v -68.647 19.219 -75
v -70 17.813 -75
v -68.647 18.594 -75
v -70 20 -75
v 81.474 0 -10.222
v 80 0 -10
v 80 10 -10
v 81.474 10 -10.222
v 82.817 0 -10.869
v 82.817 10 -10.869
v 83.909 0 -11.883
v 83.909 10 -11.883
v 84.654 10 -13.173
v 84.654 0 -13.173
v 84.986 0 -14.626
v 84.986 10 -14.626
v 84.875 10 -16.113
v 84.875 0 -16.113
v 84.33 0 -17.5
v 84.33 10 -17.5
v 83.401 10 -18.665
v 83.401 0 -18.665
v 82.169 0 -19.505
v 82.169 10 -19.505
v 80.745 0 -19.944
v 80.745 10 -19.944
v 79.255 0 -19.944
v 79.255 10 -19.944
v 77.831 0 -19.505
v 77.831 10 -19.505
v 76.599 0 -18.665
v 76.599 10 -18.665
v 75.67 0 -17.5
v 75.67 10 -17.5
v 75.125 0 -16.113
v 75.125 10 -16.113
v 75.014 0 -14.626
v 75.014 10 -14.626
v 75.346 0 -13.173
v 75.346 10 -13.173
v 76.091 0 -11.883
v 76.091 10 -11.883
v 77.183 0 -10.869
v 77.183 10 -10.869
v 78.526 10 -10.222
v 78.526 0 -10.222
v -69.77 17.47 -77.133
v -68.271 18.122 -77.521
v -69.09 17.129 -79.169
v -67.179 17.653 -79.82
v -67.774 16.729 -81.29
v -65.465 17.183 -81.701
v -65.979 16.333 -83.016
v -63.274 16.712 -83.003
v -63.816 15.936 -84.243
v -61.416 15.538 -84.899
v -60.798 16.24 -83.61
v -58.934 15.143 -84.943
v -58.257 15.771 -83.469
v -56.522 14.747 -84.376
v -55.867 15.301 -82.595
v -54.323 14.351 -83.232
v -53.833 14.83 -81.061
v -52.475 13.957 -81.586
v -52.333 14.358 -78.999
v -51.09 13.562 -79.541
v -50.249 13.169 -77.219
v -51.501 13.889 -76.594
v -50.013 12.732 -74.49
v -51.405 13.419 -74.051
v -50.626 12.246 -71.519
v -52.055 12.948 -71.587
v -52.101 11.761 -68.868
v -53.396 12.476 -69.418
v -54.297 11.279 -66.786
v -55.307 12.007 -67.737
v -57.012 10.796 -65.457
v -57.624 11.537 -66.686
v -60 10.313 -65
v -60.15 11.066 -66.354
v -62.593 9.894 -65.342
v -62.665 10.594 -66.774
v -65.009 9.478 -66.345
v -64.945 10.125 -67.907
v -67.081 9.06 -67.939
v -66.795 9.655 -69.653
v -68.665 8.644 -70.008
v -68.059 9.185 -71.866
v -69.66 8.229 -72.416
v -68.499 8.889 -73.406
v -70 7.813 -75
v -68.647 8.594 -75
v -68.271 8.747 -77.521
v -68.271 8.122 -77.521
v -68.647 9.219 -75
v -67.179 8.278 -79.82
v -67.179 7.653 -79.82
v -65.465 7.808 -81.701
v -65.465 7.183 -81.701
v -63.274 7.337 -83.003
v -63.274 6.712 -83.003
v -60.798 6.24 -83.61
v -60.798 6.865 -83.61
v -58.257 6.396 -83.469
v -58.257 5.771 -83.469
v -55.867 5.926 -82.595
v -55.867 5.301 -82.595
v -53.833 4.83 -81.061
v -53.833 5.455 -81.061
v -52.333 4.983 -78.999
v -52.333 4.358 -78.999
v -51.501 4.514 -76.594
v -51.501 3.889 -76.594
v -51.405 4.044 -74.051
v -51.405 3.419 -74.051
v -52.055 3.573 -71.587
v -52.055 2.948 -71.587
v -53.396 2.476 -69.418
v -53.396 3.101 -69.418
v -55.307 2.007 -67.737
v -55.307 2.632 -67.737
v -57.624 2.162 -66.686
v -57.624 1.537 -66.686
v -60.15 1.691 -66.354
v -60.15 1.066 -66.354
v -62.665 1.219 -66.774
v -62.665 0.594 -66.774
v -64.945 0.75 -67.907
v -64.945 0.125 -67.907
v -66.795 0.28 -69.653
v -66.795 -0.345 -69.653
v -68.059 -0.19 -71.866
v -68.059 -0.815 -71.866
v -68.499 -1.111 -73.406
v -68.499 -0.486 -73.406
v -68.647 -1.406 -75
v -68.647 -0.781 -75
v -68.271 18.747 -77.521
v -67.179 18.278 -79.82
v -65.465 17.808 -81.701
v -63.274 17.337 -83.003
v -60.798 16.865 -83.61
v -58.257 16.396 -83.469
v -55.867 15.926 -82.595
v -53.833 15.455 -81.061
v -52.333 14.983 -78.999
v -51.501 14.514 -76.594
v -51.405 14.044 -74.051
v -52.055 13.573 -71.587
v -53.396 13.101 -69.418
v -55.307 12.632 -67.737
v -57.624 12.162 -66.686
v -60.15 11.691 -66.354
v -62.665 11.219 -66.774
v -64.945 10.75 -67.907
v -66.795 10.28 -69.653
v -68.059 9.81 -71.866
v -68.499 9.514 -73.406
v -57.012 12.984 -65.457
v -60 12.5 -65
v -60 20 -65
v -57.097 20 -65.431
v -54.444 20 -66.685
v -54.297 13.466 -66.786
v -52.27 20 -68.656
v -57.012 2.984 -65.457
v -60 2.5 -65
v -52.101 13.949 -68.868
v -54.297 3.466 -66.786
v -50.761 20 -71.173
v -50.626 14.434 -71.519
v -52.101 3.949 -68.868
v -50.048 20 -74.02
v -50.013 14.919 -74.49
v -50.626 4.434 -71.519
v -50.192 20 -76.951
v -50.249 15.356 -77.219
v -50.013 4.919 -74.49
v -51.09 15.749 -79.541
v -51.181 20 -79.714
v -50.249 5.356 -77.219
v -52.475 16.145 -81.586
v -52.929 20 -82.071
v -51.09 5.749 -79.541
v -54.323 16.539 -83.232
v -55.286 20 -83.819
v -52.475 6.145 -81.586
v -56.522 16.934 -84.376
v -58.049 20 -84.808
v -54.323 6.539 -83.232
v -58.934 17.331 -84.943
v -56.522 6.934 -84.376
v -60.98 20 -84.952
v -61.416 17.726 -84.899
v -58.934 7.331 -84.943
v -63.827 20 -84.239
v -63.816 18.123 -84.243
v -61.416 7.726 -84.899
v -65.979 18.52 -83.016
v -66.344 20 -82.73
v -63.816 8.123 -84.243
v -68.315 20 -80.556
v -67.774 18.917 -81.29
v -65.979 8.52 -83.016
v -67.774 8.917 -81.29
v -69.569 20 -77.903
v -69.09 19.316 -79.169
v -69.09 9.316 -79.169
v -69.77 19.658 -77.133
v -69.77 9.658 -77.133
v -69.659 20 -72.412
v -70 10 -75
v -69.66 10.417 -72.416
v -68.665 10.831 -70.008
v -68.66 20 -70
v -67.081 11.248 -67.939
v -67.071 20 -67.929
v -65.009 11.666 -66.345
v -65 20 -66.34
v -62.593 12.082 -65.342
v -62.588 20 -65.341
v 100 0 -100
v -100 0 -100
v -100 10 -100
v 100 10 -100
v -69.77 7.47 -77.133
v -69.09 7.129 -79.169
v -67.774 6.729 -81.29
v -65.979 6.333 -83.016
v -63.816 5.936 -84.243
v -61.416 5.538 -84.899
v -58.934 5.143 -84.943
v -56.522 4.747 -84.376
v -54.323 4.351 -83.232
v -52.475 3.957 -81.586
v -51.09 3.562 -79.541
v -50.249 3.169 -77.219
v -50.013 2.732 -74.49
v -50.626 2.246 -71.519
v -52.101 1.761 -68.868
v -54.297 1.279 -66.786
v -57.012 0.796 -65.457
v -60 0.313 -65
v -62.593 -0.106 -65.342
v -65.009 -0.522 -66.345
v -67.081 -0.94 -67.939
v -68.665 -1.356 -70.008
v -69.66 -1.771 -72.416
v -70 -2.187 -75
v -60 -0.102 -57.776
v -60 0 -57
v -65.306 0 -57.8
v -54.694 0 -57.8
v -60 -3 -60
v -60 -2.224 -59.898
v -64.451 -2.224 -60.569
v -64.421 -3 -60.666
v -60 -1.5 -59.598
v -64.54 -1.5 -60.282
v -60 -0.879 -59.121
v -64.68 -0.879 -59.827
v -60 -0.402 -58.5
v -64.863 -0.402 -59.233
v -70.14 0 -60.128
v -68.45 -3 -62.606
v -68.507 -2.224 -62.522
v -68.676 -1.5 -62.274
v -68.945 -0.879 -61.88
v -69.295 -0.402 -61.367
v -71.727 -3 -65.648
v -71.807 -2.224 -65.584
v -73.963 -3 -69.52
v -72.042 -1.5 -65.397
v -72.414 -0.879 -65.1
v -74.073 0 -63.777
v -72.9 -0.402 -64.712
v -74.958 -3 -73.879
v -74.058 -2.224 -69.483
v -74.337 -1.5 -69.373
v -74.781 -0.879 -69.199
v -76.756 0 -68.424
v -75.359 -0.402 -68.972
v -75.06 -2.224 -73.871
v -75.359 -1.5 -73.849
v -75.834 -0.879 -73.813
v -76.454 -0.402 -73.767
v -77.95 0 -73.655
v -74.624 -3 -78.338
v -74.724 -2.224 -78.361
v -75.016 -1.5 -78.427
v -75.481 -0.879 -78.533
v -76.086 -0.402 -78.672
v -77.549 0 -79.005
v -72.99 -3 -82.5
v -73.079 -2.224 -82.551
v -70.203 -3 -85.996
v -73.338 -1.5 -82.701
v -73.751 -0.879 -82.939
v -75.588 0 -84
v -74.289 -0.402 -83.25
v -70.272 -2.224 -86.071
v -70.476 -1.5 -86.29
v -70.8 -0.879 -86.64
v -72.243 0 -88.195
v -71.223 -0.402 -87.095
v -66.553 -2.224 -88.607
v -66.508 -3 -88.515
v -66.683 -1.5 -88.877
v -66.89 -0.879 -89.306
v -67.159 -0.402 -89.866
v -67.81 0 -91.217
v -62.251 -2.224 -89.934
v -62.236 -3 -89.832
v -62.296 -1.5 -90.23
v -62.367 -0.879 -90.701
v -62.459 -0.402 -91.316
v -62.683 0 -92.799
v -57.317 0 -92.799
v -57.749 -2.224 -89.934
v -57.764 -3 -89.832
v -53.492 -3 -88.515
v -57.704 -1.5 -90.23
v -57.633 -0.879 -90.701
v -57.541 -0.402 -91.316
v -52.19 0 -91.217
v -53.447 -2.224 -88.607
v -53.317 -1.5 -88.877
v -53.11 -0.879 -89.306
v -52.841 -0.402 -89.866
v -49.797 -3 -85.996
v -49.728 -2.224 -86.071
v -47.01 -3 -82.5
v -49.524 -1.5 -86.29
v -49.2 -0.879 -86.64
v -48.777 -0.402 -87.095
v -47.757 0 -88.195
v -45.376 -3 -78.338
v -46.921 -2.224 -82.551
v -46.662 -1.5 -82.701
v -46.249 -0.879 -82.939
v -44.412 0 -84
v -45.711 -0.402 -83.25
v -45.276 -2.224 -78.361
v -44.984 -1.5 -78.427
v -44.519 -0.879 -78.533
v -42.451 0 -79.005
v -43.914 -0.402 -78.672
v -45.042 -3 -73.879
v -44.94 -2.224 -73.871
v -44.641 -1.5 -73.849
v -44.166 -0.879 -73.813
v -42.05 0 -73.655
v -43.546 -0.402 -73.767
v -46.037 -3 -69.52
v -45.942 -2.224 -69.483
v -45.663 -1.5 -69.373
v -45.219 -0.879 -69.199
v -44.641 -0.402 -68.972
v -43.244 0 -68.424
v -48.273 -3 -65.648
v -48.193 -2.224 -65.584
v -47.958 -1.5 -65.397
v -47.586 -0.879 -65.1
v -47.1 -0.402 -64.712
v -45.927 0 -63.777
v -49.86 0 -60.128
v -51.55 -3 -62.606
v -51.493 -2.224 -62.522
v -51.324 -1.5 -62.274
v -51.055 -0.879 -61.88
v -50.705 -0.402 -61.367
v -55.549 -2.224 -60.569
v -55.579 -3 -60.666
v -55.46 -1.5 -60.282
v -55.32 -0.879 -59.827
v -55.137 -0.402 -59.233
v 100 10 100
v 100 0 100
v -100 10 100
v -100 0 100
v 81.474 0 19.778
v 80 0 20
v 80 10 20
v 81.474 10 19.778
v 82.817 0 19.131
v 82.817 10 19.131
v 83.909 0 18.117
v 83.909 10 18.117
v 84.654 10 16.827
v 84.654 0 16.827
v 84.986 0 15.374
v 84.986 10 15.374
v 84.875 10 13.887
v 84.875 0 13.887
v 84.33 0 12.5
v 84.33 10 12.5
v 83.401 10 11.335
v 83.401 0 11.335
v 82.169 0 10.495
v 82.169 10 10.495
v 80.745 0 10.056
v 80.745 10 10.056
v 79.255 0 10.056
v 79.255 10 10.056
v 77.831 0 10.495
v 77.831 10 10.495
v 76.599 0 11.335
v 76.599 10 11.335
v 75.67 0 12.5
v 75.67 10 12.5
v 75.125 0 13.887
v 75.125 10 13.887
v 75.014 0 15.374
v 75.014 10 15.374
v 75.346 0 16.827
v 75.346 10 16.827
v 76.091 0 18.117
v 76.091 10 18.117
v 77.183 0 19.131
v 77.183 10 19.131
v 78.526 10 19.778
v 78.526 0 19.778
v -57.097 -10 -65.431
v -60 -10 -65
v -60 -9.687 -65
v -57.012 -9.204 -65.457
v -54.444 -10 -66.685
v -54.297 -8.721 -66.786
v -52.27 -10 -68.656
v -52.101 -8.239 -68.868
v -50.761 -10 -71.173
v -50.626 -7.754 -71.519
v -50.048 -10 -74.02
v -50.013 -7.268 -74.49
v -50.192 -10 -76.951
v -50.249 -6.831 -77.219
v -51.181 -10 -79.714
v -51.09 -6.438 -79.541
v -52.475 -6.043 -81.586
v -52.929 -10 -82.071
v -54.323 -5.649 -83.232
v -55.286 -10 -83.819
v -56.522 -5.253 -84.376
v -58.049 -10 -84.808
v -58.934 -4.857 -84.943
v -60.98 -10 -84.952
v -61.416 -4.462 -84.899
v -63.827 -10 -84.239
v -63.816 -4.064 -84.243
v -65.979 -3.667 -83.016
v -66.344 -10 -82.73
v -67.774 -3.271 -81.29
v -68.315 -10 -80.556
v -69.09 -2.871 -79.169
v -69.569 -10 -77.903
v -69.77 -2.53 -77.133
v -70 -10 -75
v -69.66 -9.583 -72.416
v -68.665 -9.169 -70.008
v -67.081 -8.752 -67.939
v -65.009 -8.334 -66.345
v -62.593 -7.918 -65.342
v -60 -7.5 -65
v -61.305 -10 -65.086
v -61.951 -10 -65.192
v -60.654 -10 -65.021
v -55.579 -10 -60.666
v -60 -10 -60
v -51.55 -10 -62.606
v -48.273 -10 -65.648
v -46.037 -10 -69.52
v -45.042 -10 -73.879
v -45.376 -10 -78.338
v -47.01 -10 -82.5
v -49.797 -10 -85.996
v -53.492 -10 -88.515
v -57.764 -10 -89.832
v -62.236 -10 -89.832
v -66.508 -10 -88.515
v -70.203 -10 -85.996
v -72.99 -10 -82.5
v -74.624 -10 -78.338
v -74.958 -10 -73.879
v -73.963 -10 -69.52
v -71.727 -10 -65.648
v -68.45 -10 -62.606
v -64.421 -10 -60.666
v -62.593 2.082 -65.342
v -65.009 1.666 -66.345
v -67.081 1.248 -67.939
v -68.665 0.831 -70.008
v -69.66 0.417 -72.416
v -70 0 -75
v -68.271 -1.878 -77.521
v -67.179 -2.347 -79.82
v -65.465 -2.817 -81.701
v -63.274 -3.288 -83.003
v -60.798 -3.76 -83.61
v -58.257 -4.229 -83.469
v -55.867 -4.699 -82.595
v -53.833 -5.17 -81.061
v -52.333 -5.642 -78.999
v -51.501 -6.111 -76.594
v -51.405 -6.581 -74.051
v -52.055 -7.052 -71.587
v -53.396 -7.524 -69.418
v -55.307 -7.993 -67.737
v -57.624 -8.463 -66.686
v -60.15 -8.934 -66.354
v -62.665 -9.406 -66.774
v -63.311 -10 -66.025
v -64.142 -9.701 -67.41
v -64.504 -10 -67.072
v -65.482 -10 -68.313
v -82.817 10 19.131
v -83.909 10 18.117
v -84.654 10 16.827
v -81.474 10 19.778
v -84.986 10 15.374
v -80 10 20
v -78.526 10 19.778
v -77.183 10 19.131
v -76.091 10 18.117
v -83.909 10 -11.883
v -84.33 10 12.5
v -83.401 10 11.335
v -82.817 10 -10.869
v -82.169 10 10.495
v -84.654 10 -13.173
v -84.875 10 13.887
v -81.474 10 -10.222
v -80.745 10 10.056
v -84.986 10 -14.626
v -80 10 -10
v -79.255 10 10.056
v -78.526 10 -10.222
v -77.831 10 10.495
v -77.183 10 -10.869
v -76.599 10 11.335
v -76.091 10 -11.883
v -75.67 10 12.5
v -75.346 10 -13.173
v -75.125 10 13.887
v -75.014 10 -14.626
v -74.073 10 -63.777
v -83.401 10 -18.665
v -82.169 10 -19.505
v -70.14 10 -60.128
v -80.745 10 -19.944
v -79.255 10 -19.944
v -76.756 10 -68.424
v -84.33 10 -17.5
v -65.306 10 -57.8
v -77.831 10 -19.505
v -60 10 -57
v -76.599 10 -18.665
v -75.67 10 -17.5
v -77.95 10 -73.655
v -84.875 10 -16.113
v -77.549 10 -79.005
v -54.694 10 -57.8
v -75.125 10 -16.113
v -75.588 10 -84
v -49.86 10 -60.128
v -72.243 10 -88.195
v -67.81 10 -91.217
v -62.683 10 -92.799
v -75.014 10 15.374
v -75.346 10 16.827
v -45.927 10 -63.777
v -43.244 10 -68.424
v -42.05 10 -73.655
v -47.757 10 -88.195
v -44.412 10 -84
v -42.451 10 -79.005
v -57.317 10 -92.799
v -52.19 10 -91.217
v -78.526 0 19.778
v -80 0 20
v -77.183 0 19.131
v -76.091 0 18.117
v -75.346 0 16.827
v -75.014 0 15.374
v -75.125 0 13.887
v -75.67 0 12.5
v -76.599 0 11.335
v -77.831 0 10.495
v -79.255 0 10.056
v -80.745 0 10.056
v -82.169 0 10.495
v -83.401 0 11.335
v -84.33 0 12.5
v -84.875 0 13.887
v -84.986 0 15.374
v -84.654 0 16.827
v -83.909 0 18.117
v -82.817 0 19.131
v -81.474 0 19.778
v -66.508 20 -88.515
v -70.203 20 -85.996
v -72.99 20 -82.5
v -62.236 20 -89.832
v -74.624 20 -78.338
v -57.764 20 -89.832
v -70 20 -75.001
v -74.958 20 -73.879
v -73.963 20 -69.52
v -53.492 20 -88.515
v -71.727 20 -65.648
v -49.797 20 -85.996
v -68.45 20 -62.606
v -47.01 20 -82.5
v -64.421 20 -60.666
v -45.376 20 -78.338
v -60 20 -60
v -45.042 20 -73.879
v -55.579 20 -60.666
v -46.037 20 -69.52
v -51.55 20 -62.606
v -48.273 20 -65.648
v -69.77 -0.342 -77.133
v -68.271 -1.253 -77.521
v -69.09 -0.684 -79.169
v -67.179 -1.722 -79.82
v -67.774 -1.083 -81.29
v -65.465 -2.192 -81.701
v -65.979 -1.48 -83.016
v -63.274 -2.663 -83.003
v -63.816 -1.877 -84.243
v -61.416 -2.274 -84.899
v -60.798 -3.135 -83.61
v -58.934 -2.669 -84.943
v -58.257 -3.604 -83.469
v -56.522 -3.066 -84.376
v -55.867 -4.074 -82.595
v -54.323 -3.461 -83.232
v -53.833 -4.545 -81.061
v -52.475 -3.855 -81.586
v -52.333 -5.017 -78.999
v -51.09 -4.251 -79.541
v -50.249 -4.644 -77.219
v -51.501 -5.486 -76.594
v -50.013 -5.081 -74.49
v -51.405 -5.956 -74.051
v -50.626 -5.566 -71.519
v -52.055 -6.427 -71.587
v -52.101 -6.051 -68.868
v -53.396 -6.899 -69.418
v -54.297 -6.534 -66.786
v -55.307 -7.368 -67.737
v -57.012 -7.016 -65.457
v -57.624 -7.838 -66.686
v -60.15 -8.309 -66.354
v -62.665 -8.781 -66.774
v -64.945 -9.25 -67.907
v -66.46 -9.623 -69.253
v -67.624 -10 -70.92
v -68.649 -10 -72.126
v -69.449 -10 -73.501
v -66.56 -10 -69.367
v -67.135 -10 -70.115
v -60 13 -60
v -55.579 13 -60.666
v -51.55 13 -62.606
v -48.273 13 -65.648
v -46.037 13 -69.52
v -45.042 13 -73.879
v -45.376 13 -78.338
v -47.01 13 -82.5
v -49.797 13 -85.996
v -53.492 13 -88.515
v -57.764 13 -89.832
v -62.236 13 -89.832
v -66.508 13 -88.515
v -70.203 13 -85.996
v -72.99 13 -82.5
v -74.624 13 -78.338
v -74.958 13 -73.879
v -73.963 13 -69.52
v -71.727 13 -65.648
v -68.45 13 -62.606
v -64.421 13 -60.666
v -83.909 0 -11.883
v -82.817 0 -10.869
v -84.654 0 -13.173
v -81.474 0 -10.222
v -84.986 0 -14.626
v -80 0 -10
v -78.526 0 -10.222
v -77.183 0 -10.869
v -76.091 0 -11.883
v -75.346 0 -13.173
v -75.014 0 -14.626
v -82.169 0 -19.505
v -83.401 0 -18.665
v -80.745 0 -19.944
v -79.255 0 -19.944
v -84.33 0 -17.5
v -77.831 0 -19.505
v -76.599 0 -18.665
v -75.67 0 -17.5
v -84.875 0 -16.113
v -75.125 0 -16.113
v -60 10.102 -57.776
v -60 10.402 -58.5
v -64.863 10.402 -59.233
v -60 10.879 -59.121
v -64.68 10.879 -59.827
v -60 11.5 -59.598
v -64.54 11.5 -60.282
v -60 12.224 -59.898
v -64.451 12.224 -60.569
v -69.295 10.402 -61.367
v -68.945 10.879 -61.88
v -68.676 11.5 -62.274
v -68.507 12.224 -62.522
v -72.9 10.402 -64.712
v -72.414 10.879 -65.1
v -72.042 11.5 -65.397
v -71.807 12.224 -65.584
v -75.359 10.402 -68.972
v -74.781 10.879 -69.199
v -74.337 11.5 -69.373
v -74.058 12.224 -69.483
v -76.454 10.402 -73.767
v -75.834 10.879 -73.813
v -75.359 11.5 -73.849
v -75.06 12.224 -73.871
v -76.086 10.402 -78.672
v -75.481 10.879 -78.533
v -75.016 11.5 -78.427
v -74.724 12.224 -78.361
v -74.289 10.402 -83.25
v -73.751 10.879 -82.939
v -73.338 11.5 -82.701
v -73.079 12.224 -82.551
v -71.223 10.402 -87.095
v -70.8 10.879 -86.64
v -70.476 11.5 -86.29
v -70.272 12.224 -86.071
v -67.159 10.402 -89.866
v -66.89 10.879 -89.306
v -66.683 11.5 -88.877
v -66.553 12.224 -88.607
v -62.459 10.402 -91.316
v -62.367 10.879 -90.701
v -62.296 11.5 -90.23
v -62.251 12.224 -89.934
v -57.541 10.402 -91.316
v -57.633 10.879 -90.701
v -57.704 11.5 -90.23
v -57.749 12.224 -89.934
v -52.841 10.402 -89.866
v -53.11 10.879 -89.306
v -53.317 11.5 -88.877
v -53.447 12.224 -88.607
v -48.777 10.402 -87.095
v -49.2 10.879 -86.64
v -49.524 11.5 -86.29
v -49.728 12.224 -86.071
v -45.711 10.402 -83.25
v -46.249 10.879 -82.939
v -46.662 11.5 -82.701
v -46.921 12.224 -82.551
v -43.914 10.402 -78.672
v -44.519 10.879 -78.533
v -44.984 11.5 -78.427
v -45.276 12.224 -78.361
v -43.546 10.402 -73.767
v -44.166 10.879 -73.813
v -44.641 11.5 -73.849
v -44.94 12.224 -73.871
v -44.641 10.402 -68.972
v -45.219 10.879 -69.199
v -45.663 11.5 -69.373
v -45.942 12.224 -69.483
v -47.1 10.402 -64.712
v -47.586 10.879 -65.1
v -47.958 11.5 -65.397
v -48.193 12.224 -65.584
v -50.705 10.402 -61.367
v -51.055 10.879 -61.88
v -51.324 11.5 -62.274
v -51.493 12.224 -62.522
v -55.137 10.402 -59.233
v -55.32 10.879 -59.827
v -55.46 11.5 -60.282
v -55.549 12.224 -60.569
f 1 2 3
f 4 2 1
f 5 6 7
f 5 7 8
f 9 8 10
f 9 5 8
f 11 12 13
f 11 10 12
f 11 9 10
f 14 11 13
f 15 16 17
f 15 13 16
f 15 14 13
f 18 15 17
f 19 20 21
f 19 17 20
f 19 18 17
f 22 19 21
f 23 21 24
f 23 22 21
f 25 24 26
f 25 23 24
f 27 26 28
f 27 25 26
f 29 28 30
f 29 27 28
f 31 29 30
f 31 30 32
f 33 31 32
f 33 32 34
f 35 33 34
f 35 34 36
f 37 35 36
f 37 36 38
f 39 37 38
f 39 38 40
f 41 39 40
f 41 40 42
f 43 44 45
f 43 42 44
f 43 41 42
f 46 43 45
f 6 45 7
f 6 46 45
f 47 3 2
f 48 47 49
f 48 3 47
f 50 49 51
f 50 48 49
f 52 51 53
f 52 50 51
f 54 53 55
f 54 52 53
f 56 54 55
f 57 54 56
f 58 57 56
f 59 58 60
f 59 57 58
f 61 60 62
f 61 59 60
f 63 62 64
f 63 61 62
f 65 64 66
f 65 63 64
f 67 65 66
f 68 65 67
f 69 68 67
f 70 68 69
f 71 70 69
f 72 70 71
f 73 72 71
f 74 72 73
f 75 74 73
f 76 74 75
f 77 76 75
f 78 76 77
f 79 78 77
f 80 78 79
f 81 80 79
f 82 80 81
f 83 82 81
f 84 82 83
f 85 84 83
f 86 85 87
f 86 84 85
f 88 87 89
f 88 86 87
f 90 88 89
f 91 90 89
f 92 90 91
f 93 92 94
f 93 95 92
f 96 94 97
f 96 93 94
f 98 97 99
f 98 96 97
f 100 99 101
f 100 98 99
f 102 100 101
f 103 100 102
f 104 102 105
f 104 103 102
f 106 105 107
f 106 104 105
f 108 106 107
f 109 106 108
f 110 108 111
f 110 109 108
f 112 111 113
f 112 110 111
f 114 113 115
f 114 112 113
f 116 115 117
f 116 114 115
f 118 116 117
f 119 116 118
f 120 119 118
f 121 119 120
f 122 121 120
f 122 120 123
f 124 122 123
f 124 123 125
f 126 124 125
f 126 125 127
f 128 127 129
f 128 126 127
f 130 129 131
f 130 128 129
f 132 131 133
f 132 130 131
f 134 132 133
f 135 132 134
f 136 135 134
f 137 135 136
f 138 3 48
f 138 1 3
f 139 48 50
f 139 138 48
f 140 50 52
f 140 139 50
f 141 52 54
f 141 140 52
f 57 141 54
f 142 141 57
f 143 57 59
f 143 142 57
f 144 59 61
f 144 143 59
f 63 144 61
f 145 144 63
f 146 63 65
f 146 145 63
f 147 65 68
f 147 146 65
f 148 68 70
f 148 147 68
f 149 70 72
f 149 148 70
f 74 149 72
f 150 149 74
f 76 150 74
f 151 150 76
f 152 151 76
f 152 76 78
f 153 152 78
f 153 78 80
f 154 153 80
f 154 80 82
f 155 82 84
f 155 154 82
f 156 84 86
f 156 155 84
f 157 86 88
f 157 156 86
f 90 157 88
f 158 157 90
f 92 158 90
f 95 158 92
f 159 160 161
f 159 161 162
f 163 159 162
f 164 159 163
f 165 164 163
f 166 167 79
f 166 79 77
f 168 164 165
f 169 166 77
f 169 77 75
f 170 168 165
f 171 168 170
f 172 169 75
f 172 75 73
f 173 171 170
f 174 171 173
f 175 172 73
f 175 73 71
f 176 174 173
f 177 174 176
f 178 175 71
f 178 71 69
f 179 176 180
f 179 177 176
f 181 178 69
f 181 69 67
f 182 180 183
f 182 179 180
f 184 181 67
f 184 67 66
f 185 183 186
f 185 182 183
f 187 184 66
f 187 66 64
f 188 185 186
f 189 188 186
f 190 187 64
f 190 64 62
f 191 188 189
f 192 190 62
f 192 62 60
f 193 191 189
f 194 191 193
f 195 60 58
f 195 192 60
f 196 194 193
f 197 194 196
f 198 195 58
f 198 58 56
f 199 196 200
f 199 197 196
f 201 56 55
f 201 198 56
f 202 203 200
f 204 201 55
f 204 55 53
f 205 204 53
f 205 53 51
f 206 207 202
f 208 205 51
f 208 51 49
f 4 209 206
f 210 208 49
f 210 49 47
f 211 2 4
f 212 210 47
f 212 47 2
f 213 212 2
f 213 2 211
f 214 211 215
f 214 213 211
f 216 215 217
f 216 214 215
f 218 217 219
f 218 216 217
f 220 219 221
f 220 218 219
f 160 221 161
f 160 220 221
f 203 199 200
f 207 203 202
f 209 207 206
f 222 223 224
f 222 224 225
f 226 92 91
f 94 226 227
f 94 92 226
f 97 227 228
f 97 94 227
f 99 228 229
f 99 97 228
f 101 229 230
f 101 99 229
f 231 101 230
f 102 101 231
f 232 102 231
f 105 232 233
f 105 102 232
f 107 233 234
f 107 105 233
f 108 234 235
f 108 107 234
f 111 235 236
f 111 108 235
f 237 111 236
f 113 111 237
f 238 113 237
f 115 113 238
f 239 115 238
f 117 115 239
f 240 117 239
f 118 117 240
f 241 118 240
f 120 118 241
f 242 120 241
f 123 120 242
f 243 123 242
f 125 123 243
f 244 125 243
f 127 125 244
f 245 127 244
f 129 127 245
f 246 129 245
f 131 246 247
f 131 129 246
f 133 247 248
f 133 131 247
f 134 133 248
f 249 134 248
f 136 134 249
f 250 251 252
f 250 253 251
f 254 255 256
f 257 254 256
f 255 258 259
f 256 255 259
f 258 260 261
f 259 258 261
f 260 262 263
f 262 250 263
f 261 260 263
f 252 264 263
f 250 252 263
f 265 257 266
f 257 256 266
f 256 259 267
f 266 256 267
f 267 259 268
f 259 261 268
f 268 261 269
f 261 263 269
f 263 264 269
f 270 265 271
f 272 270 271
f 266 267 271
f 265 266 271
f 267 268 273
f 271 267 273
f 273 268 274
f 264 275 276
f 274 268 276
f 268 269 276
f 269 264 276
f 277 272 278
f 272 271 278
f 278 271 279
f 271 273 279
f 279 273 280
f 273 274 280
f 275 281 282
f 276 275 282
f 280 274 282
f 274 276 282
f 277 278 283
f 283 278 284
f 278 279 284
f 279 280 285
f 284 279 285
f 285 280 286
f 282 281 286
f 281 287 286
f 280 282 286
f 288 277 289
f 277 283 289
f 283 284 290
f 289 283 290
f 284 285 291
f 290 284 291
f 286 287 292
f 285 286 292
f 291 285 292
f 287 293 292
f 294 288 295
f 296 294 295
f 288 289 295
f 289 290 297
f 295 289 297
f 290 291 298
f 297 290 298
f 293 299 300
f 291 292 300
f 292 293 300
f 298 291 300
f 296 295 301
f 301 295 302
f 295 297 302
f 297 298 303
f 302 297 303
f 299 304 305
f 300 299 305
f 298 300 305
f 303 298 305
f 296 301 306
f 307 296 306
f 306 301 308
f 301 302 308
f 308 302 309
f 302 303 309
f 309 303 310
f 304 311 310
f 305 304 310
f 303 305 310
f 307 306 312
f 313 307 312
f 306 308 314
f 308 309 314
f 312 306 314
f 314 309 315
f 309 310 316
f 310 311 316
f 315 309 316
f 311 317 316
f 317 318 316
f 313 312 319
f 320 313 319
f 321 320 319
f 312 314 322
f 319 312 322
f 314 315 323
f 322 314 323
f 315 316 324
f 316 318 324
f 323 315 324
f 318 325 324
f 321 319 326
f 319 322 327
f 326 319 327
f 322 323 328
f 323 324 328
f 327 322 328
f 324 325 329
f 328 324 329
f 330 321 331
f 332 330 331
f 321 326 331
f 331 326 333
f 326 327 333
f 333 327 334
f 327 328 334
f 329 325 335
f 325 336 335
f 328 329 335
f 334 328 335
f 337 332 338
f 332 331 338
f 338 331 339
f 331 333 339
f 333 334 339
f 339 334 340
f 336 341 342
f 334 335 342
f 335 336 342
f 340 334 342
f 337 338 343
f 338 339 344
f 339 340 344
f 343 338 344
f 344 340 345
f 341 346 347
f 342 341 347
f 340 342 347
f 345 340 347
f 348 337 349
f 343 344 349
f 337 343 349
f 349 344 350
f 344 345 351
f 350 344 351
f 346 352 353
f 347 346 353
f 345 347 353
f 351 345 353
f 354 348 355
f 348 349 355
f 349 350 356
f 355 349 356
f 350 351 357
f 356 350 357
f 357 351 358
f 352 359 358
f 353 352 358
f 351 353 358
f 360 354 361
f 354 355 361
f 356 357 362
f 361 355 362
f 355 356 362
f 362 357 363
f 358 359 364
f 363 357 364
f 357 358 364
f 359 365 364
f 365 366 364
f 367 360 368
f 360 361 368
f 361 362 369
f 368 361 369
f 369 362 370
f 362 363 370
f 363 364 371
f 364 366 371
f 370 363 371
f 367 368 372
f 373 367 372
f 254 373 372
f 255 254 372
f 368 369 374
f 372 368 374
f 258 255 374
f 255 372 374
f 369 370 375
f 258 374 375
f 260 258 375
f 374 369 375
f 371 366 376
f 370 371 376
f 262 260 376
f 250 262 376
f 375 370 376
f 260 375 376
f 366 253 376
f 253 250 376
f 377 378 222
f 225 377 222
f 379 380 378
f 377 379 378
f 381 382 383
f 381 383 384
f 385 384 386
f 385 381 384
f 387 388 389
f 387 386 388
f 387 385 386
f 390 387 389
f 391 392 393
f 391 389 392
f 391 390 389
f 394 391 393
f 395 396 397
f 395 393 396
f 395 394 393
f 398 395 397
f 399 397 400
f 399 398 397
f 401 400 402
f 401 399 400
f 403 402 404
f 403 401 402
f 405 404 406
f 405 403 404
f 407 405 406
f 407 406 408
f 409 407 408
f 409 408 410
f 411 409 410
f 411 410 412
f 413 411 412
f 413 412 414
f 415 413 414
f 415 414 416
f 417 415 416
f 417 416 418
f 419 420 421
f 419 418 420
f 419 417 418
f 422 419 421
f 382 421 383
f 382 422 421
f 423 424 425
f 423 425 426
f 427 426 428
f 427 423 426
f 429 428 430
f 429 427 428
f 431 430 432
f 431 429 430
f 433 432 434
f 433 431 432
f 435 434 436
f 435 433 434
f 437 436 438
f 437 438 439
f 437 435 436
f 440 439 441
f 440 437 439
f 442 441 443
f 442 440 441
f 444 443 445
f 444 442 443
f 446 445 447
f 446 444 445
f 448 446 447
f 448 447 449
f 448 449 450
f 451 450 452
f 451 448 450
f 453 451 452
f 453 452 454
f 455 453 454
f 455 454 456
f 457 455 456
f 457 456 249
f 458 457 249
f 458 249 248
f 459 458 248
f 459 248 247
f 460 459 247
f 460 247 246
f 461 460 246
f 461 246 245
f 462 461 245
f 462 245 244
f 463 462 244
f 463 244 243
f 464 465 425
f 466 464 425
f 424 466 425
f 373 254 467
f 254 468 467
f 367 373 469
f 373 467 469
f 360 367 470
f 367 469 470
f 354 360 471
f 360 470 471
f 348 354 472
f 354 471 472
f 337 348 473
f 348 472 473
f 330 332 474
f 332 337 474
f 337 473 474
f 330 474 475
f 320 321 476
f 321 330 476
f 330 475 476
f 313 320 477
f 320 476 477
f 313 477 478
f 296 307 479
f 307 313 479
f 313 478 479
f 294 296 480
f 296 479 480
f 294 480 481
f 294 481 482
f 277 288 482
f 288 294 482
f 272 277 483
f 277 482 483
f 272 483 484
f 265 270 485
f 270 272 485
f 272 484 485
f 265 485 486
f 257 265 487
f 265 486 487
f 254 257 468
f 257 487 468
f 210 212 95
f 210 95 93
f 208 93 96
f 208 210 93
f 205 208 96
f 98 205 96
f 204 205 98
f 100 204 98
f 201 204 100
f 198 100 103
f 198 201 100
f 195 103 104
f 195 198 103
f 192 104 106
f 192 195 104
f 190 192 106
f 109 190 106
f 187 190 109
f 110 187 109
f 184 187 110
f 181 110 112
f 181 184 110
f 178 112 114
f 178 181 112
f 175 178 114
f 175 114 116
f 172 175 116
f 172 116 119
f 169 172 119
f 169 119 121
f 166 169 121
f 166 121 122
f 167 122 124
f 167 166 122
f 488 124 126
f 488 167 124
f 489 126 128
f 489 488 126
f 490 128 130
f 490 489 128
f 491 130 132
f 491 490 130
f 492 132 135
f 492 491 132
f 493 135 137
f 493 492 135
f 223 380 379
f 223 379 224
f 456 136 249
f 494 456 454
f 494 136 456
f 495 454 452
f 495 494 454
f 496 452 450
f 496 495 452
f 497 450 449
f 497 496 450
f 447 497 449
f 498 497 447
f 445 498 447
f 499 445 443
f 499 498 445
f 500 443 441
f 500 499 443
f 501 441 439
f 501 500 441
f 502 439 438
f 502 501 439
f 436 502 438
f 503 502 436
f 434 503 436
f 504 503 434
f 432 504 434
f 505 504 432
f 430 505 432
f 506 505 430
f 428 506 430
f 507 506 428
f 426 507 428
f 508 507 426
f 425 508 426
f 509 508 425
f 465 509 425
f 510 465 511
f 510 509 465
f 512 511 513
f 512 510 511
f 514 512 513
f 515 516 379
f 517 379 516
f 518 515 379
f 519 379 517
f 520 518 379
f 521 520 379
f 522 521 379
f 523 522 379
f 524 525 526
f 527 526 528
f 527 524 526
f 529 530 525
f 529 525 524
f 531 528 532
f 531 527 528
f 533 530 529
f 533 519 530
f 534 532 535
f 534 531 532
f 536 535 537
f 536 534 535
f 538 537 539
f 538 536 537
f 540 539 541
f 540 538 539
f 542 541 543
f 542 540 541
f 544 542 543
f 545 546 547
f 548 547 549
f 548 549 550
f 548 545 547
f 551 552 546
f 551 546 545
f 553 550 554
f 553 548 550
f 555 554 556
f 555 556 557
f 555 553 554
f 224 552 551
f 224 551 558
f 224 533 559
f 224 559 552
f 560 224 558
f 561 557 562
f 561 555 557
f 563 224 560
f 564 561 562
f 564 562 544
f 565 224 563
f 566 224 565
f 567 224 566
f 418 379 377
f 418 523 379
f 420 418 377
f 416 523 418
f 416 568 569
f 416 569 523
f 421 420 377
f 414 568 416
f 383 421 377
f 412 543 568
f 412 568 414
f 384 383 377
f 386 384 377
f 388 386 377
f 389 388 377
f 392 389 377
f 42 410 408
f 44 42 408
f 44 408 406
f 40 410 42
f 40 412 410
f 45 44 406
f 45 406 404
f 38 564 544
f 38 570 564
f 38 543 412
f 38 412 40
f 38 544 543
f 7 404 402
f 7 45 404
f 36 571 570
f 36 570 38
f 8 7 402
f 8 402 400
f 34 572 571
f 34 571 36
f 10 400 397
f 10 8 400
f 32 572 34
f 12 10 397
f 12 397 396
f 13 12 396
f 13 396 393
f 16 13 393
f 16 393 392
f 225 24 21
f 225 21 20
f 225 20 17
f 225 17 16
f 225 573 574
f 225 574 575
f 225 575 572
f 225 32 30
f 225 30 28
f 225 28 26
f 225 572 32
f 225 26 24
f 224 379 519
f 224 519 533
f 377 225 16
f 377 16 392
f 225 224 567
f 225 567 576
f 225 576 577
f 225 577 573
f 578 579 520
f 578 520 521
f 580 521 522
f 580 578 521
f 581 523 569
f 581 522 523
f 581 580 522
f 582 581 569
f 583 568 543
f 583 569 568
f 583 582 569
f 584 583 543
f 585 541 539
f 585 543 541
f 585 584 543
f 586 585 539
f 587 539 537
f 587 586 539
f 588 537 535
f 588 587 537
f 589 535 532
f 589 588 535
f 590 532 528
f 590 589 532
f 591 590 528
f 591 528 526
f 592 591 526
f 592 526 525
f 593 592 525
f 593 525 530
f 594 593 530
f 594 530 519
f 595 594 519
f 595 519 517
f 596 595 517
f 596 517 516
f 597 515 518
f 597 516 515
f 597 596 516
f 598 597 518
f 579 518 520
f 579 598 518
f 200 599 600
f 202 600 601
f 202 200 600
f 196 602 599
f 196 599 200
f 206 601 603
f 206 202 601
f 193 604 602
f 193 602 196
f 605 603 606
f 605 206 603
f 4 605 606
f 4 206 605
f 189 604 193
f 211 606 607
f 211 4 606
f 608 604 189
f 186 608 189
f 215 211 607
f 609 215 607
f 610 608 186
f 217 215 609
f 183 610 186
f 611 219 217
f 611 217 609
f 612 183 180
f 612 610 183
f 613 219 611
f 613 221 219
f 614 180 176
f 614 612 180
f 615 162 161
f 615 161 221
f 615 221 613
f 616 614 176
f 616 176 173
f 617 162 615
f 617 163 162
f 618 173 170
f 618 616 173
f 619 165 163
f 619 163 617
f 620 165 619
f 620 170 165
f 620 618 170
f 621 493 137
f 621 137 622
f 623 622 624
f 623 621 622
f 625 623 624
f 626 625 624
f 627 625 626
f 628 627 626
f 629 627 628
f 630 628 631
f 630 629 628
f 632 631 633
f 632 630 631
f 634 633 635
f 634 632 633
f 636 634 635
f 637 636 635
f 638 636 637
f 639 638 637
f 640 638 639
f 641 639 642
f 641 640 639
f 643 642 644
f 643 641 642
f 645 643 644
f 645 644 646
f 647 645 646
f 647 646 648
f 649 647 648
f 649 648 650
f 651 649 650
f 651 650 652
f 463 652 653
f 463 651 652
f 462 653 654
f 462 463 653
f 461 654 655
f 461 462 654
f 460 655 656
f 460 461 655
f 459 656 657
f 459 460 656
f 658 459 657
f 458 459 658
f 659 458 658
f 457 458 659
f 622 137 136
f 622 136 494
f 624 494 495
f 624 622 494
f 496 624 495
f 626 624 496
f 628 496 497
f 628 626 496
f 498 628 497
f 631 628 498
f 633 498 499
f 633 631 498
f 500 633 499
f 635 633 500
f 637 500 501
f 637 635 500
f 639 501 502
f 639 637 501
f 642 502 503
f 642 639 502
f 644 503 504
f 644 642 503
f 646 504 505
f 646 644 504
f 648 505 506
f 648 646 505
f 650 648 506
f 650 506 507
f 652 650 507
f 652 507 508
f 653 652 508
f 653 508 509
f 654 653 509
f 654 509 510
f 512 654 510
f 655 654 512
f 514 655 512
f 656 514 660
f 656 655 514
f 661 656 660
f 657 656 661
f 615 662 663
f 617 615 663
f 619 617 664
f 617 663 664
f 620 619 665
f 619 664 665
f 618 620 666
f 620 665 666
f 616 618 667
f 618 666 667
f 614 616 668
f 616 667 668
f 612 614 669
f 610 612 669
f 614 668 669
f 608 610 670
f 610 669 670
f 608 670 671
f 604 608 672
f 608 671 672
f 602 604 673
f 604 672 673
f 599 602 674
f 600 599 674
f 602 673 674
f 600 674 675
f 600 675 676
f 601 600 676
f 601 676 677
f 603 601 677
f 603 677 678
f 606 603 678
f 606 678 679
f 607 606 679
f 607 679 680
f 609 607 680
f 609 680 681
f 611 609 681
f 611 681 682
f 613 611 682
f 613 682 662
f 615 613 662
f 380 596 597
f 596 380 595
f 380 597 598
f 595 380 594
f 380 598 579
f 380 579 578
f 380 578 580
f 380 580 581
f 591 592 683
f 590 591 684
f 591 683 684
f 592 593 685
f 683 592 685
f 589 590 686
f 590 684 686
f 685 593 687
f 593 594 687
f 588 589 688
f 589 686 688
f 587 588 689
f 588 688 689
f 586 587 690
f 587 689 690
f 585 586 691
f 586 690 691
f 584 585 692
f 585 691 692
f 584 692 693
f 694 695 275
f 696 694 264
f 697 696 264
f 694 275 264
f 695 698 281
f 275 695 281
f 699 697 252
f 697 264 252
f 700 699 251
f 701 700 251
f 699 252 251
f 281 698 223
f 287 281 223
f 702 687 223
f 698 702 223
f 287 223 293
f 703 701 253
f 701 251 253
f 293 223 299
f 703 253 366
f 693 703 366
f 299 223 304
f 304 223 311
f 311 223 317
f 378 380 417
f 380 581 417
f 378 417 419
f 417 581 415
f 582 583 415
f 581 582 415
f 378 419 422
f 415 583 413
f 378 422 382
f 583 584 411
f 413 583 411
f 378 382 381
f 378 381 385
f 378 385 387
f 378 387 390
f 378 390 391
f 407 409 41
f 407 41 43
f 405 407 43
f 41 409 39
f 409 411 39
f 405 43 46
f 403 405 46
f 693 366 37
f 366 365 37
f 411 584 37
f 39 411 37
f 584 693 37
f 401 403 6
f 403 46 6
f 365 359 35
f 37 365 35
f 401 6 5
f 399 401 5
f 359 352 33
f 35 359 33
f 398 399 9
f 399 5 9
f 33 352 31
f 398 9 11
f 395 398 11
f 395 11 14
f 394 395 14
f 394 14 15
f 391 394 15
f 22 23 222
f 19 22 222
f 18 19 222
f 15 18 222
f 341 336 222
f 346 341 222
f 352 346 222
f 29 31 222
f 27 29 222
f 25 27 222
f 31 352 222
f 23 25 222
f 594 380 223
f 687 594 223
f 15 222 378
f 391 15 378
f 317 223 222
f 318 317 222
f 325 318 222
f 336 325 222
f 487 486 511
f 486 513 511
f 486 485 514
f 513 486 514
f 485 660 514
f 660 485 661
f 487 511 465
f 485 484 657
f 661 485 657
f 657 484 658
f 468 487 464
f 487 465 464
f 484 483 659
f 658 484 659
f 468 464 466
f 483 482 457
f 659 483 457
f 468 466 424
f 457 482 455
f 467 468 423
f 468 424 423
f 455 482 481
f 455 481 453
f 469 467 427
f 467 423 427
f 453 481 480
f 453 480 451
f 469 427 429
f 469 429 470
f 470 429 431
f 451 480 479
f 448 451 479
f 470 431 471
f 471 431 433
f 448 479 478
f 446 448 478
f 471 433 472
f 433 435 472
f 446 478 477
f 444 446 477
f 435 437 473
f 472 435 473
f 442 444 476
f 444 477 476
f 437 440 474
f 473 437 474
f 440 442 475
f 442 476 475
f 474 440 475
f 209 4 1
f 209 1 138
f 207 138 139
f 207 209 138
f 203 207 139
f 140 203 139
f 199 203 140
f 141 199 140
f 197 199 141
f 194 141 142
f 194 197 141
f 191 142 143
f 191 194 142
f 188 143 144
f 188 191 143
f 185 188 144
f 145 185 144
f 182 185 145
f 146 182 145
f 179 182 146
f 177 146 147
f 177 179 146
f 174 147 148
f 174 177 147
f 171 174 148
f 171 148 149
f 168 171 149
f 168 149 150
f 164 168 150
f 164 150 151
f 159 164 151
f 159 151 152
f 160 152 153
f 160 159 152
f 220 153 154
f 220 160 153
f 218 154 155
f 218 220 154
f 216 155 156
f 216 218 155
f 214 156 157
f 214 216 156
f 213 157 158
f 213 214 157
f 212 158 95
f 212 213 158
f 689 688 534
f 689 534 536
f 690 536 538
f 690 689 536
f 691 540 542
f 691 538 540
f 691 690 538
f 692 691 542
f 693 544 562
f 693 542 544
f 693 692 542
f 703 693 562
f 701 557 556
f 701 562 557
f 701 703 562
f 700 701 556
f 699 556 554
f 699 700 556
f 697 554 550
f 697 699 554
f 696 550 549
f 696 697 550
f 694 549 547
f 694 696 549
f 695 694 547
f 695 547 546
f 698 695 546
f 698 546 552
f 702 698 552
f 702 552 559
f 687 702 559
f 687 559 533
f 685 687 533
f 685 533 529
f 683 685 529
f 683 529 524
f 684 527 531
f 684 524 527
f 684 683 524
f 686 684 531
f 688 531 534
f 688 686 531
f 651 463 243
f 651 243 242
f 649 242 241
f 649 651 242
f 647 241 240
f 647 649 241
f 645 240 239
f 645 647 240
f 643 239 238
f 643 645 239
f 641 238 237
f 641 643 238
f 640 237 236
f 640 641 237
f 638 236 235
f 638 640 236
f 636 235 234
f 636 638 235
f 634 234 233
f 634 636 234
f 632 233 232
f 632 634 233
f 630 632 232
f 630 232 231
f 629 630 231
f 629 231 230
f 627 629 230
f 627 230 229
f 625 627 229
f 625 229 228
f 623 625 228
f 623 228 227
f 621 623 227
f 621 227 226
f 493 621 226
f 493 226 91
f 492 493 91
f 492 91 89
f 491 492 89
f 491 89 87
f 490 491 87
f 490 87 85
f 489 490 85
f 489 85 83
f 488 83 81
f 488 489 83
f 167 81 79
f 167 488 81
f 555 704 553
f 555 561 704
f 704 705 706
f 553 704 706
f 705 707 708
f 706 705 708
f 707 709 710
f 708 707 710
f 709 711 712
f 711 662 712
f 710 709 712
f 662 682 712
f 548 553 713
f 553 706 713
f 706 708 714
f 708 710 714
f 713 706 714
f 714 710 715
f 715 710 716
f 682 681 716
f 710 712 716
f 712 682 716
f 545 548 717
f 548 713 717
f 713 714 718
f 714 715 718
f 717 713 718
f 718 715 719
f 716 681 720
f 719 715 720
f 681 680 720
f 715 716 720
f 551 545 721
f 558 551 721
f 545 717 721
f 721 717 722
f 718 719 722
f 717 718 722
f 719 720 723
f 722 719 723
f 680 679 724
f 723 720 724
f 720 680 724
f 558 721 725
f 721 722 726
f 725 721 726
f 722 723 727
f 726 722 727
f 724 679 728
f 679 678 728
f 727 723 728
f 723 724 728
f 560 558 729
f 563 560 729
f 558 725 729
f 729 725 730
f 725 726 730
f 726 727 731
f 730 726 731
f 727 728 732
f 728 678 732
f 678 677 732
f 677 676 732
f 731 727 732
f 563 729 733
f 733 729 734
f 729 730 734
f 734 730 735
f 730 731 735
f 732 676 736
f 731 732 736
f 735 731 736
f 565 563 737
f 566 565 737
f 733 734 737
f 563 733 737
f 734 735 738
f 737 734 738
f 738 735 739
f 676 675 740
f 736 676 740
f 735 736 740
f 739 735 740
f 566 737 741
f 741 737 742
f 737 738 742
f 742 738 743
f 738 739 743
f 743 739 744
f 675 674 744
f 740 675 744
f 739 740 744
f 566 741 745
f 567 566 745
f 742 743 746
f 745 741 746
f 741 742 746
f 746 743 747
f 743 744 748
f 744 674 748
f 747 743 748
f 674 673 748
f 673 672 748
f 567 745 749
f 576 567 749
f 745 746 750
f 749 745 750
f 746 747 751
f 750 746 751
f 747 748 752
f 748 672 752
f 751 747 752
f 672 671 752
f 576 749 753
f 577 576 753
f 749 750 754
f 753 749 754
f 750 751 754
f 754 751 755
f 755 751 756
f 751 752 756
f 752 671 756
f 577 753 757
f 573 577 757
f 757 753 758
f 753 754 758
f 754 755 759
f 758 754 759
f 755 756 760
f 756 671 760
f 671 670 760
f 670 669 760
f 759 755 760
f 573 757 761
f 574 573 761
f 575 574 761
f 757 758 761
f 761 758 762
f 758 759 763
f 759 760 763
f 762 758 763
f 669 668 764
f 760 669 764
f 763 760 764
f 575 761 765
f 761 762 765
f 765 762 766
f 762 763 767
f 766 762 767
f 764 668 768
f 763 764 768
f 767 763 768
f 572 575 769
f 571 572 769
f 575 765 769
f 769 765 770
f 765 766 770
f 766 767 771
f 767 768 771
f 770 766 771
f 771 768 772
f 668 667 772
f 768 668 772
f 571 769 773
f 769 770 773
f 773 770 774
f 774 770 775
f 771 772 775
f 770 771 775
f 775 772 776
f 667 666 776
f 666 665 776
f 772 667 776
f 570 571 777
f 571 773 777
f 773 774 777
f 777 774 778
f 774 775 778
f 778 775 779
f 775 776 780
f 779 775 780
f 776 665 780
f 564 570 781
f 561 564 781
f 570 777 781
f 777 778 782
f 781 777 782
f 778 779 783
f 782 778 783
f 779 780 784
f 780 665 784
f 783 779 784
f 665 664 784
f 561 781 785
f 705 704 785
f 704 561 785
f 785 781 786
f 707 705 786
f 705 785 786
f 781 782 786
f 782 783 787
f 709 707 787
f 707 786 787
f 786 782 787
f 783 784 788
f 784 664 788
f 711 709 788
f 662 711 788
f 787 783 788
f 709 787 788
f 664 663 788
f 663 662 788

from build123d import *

# Parameters (mm, degrees)
SKETCH1_W                = 200
SKETCH1_H                = 200
BOSS_EXTRUDE1_DEPTH      = 10
CUT_EXTRUDE1_DEPTH       = 142.774468788
CUT_EXTRUDE1_DEPTH_BACK  = 142.774468788
SKETCH2_R                = 5
BOSS_EXTRUDE2_DEPTH      = 20
BOSS_EXTRUDE2_DEPTH_BACK = 10
SKETCH3_R                = 15
SKETCH3_R_2              = 10
FILLET1_R                = 3
CUT_EXTRUDE2_DEPTH       = 143.828568571
CUT_EXTRUDE2_DEPTH_BACK  = 143.828568571
SKETCH8_R                = 10
THREAD1_PITCH            = 10
CUT_EXTRUDE3_DEPTH       = 143.828592839
CUT_EXTRUDE3_DEPTH_BACK  = 143.828592839
SKETCH11_W               = 30
SKETCH11_H               = 5.972577122


with BuildPart() as part:
    # Sketch1 → Boss-Extrude1 (new body)
    with BuildSketch(Plane(origin=(0, 0, 0), x_dir=(1, 0, 0), z_dir=(0, 1, 0))):
        Rectangle(SKETCH1_W, SKETCH1_H)
    extrude(amount=BOSS_EXTRUDE1_DEPTH)

    # Sketch2 → Cut-Extrude1 (cut, two sides: drawn at the far end of the back side and taken through both)
    with BuildSketch(Plane(origin=(0, 0, 0), x_dir=(1, 0, 0), z_dir=(0, 1, 0)).offset(-CUT_EXTRUDE1_DEPTH_BACK)):
        with Locations(Location((-80, 15, 0), (0, 0, 270))):
            Circle(SKETCH2_R)
        with Locations(Location((-80, -15, 0), (0, 0, 270))):
            Circle(SKETCH2_R)
        with Locations(Location((80, 15, 0), (0, 0, 270))):
            Circle(SKETCH2_R)
        with Locations(Location((80, -15, 0), (0, 0, 270))):
            Circle(SKETCH2_R)
    extrude(amount=CUT_EXTRUDE1_DEPTH + CUT_EXTRUDE1_DEPTH_BACK, mode=Mode.SUBTRACT)

    # Sketch3 → Boss-Extrude2 (add, two sides: drawn at the far end of the back side and taken through both)
    with BuildSketch(Plane(origin=(0, 0, 0), x_dir=(1, 0, 0), z_dir=(0, 1, 0)).offset(-BOSS_EXTRUDE2_DEPTH_BACK)):
        with Locations(Location((-60, 75, 0), (0, 0, 270))):
            Circle(SKETCH3_R)
        with Locations(Location((-60, 75, 0), (0, 0, 270))):
            Circle(SKETCH3_R_2, mode=Mode.SUBTRACT)
    extrude(amount=BOSS_EXTRUDE2_DEPTH + BOSS_EXTRUDE2_DEPTH_BACK)

    # Fillet1
    fillet1_edges = [part.edges().sort_by_distance(p)[0] for p in [
        (-60, 10, -90),
        (-60, 0, -90),
    ]]
    fillet(fillet1_edges, radius=FILLET1_R)

    # Sketch8 → Cut-Extrude2 (cut, two sides: drawn at the far end of the back side and taken through both)
    with BuildSketch(Plane(origin=(0, 0, 0), x_dir=(1, 0, 0), z_dir=(0, 1, 0)).offset(-CUT_EXTRUDE2_DEPTH_BACK)):
        with Locations(Location((-60, 75, 0), (0, 0, 270))):
            Circle(SKETCH8_R)
    extrude(amount=CUT_EXTRUDE2_DEPTH + CUT_EXTRUDE2_DEPTH_BACK, mode=Mode.SUBTRACT)

    # Thread1: the profile of Thread Profile1 profile screwed along a right-hand helix of 3 turns, 16 arcs to a turn; built about Z, then put on its axis
    thread1_z = Axis((0, 0, 0), (0, 0, 1))
    thread1_corners = [(10.0003, 0, -0.000173205), (10.0003, 0, 2.187673198), (8.646835313, 0, 1.406249997), (8.646835313, 0, 0.781249997)]
    with BuildLine(mode=Mode.PRIVATE) as thread1_profile:
        Line(thread1_corners[0], thread1_corners[1])
        Line(thread1_corners[1], thread1_corners[2])
        Line(thread1_corners[2], thread1_corners[3])
        Line(thread1_corners[3], thread1_corners[0])
    thread1_cap = Face(thread1_profile.wire())
    thread1_turn_angles = [0, 11.25, 22.5, 33.75, 45, 56.25, 67.5, 78.75, 90, 101.25, 112.5, 123.75, 135, 146.25, 157.5, 168.75, 180, 191.25, 202.5, 213.75, 225, 236.25, 247.5, 258.75, 270, 281.25, 292.5, 303.75, 315, 326.25, 337.5, 348.75, 360]
    thread1_turn_weights = [1, 0.9807852804032304, 1, 0.9807852804032304, 1, 0.9807852804032304, 1, 0.9807852804032304, 1, 0.9807852804032304, 1, 0.9807852804032304, 1, 0.9807852804032304, 1, 0.9807852804032304, 1, 0.9807852804032304, 1, 0.9807852804032304, 1, 0.9807852804032304, 1, 0.9807852804032304, 1, 0.9807852804032304, 1, 0.9807852804032304, 1, 0.9807852804032304, 1, 0.9807852804032304, 1]
    thread1_turn_rails = [Edge.make_bspline([Vector(p[0], p[1], 0).rotate(thread1_z, thread1_turn_angles[k]) / thread1_turn_weights[k] + Vector(0, 0, p[2] + THREAD1_PITCH * thread1_turn_angles[k] / 360) for k in range(33)], [0, 0, 0, 1, 1, 2, 2, 3, 3, 4, 4, 5, 5, 6, 6, 7, 7, 8, 8, 9, 9, 10, 10, 11, 11, 12, 12, 13, 13, 14, 14, 15, 15, 16, 16, 16], 2, thread1_turn_weights) for p in thread1_corners]
    thread1_turn_sides = [Face.make_surface_from_curves(thread1_turn_rails[p[0]], thread1_turn_rails[p[1]]) for p in [(0, 1), (1, 2), (2, 3), (3, 0)]]
    thread1 = Plane(origin=(-60, 20, -75), x_dir=(-1, 0, 0), z_dir=(0, -1, 0)) * Solid(Shell([*[p.moved(Location((0, 0, THREAD1_PITCH * i))) for i in range(3) for p in thread1_turn_sides], thread1_cap, thread1_cap.rotate(thread1_z, 1080).moved(Location((0, 0, THREAD1_PITCH * 1080 / 360)))]))
    add(thread1)

    # Sketch11 → Cut-Extrude3 (cut, two sides: drawn at the far end of the back side and taken through both)
    with BuildSketch(Plane.XY.offset(-CUT_EXTRUDE3_DEPTH_BACK)):
        with Locations((-60, -12.986288561)):
            Rectangle(SKETCH11_W, SKETCH11_H)
    extrude(amount=CUT_EXTRUDE3_DEPTH + CUT_EXTRUDE3_DEPTH_BACK, mode=Mode.SUBTRACT)


solid = part.part
